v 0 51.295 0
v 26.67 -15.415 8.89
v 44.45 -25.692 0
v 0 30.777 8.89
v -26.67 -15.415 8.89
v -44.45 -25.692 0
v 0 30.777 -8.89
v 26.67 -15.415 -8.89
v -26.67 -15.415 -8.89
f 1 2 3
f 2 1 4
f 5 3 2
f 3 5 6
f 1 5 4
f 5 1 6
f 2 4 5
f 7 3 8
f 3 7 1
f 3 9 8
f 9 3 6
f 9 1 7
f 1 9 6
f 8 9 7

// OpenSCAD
//Enter in inches long each side is
side = 3.5;

//Enter in inches how high it is
height = 0.7;

//Leave the back flat?
flat_back = 0; // [1:Leave Back Flat, 0:No! Both Sides]

s = side*25.4;
h = height*25.4*5;

module triangle()
{
scale([s,s,h]){
difference(){
translate([-0.5, -0.289, 0])
polyhedron(
	points=[[0,0,0],[1,0,0],[0.5,0.866,0],[0.5,0.289,0.25]],
	faces =[[0,1,2],[1,0,3],[2,1,3],[0,2,3]]
);
translate([-1.5,-1.5,0.1])cube(3);
}
}}

union()
{
triangle();
if (flat_back == 0)
{
mirror([0,0,1]){
triangle();
}
}
}
